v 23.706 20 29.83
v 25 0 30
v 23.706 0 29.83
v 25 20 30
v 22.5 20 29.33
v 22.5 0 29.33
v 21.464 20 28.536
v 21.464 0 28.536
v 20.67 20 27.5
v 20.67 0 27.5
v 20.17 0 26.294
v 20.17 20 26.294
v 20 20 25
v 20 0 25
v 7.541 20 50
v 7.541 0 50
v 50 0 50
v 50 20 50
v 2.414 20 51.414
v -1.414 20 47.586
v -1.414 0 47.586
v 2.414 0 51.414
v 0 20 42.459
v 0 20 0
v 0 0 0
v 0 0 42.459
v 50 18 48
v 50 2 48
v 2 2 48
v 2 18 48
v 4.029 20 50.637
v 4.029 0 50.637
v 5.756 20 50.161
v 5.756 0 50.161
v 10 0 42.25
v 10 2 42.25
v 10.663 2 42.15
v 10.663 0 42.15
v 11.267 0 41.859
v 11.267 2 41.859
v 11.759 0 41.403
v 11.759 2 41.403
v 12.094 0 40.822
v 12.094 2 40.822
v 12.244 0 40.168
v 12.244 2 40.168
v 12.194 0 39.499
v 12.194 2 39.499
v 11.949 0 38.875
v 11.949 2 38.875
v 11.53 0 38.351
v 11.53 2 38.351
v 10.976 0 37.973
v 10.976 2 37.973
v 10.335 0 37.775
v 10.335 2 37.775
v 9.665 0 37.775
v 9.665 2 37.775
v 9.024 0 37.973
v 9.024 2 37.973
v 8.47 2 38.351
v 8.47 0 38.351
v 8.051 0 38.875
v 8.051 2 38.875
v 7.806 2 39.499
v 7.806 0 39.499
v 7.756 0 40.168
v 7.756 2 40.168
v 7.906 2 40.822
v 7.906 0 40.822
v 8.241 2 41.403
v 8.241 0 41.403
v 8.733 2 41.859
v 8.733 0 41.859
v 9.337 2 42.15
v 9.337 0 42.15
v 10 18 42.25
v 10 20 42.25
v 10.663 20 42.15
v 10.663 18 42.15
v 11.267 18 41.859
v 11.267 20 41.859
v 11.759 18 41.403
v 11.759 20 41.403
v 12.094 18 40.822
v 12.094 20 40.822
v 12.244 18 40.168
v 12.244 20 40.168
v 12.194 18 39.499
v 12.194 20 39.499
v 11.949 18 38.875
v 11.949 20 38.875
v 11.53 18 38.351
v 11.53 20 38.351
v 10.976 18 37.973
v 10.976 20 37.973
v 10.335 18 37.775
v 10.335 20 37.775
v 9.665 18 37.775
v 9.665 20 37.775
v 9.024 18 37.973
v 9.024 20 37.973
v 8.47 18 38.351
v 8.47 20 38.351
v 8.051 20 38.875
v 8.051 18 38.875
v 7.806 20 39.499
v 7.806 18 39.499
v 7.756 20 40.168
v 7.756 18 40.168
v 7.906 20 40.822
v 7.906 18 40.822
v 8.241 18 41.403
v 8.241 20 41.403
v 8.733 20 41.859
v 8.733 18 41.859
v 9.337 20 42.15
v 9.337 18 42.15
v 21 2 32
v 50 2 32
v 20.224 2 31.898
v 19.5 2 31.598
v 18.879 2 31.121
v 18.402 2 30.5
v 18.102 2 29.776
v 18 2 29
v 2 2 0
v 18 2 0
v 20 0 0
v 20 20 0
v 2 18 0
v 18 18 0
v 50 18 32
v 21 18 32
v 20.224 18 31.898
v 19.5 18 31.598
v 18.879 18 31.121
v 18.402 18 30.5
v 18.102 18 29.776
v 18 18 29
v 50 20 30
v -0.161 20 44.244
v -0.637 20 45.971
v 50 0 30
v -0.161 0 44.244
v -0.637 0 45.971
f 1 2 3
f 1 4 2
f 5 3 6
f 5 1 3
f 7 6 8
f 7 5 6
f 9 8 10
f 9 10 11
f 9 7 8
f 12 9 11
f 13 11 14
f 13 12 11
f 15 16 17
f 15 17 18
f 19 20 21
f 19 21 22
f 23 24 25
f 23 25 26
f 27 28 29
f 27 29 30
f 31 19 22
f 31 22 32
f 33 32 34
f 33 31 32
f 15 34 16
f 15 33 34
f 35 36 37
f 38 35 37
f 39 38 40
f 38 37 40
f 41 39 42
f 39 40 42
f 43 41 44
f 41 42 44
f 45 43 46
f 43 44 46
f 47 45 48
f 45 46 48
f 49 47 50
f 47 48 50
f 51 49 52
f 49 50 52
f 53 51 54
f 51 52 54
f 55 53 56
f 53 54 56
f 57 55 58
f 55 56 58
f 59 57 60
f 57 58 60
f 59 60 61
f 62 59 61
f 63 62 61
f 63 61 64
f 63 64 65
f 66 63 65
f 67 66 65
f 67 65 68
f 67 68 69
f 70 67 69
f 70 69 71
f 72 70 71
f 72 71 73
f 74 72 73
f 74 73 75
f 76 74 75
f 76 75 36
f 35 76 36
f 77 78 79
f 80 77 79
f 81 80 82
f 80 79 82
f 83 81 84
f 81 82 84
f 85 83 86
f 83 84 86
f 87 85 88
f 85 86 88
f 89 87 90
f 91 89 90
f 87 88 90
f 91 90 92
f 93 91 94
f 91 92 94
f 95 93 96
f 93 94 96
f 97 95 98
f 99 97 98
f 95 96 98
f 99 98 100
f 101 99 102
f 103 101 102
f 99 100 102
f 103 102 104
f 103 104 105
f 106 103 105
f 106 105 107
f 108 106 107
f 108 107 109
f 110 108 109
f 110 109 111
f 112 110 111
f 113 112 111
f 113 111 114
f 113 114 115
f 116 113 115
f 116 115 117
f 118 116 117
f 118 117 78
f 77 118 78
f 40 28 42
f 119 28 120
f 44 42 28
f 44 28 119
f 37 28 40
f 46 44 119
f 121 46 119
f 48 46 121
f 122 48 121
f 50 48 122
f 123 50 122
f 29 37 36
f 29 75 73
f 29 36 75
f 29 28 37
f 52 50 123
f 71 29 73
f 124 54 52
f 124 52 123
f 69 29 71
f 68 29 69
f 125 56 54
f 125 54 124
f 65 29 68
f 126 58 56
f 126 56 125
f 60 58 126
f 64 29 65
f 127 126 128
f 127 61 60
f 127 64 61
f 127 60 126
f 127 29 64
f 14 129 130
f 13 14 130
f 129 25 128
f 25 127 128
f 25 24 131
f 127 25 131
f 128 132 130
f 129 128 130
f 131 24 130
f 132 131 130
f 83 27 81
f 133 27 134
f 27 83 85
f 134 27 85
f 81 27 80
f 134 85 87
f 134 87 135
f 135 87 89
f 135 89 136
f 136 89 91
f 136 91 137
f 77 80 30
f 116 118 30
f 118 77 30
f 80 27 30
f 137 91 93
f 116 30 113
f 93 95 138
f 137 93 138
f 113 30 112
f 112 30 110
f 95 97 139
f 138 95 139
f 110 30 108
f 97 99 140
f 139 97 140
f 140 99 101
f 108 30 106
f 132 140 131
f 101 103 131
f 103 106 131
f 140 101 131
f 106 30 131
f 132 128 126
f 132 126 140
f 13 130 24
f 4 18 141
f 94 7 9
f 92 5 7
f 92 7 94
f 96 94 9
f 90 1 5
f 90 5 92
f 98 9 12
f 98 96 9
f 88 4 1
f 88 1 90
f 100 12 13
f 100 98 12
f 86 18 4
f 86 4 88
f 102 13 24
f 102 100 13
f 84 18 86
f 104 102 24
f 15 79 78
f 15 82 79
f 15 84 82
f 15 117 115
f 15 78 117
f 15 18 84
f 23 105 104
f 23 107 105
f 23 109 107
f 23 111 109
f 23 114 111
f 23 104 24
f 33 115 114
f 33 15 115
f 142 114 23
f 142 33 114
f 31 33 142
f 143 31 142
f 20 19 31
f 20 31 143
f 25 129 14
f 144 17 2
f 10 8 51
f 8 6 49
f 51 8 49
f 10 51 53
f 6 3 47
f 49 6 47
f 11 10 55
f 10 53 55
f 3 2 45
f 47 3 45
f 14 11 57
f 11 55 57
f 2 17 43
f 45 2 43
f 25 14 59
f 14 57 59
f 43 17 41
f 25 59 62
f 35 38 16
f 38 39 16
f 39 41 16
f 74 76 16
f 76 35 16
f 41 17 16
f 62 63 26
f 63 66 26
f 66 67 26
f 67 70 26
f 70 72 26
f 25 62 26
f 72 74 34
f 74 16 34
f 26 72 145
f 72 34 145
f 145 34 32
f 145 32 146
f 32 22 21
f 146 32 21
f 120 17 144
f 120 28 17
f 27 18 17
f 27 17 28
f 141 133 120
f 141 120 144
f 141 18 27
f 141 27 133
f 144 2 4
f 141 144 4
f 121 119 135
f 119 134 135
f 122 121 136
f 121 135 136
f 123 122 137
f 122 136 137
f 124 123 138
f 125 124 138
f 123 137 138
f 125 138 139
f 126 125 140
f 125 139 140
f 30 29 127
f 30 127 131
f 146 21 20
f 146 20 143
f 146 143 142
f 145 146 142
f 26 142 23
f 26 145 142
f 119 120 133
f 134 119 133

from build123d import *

# Parameters (mm, degrees)
SKETCH1_W                = 20
SKETCH1_H                = 20
SKETCH1_W_2              = 16
SKETCH1_H_2              = 16
BOSS_EXTRUDE1_DEPTH      = 30
BOSS_EXTRUDE2_DEPTH      = 30
BOSS_EXTRUDE2_DEPTH_BACK = 20
SKETCH2_W                = 20
SKETCH2_H                = 20
SKETCH2_W_2              = 16
SKETCH2_H_2              = 16
SKETCH3_W                = 16
SKETCH3_H                = 16
CUT_EXTRUDE1_DEPTH       = 2
SKETCH4_W                = 16
SKETCH4_H                = 16
BOSS_EXTRUDE3_DEPTH      = 2
CHAMFER1_SIZE            = 1
BOSS_EXTRUDE4_REACH      = 83.243
SKETCH5_W                = 2
SKETCH5_H                = 20
BOSS_EXTRUDE6_REACH      = 83.243
SKETCH7_W                = 2
SKETCH7_H                = 20
FILLET1_R                = 10
FILLET2_R                = 3
CUT_EXTRUDE2_REACH       = 76.454
SKETCH8_R                = 2.25
FILLET3_R                = 5


with BuildPart() as part:
    # Sketch1 → Boss-Extrude1 (new body)
    with BuildSketch(Plane.XY):
        with Locations((10, 10)):
            Rectangle(SKETCH1_W, SKETCH1_H)
        with Locations((10, 10)):
            Rectangle(SKETCH1_W_2, SKETCH1_H_2, mode=Mode.SUBTRACT)
    extrude(amount=BOSS_EXTRUDE1_DEPTH)

    # Sketch2 → Boss-Extrude2 (add, two sides: drawn at the far end of the back side and taken through both)
    with BuildSketch(Plane(origin=(20, 0, 0), x_dir=(0, 0, -1), z_dir=(1, 0, 0)).offset(-BOSS_EXTRUDE2_DEPTH_BACK)):
        with Locations((-40, 10)):
            Rectangle(SKETCH2_W, SKETCH2_H)
        with Locations((-40, 10)):
            Rectangle(SKETCH2_W_2, SKETCH2_H_2, mode=Mode.SUBTRACT)
    extrude(amount=BOSS_EXTRUDE2_DEPTH + BOSS_EXTRUDE2_DEPTH_BACK)

    # Sketch3 → Cut-Extrude1 (cut)
    with BuildSketch(Plane(origin=(0, 0, 30), x_dir=(-1, 0, 0), z_dir=(0, 0, -1))):
        with Locations((-10, 10)):
            Rectangle(SKETCH3_W, SKETCH3_H)
    extrude(amount=-CUT_EXTRUDE1_DEPTH, mode=Mode.SUBTRACT)

    # Sketch4 → Boss-Extrude3 (add)
    with BuildSketch(Plane.ZY):
        with Locations((40, 10)):
            Rectangle(SKETCH4_W, SKETCH4_H)
    extrude(amount=-BOSS_EXTRUDE3_DEPTH)

    # Chamfer1
    chamfer1_edges = [part.edges().sort_by_distance(p)[0] for p in [
        (0, 10, 50),
    ]]
    chamfer(chamfer1_edges, length=CHAMFER1_SIZE)

    # Boss-Extrude4: up to this face of the body (flat: up to its plane)
    boss_extrude4_end = Plane(part.part.faces().sort_by_distance((0, 10, 24.5))[0])
    # Sketch5 → Boss-Extrude4 (add, up to the picked face)
    with BuildSketch(Plane(origin=(-24.5, 0, 24.5), x_dir=(0.7071067811865475, 0, 0.7071067811865477), z_dir=(-0.7071067811865477, 0, 0.7071067811865475)), mode=Mode.PRIVATE) as boss_extrude4_sk1:
        with Locations((33.648232278, 10)):
            Rectangle(SKETCH5_W, SKETCH5_H)
    boss_extrude4_tool1 = split(extrude(boss_extrude4_sk1.sketch, amount=-BOSS_EXTRUDE4_REACH, mode=Mode.PRIVATE), bisect_by=boss_extrude4_end, keep=Keep.BOTH, mode=Mode.PRIVATE)
    add(boss_extrude4_tool1.solids().sort_by(Axis((-0.707107, 10, 48.292893), (0.7071067811865477, 0, -0.7071067811865475)))[0])

    # Boss-Extrude6: up to this face of the body (flat: up to its plane)
    boss_extrude6_end = Plane(part.part.faces().sort_by_distance((25.5, 10, 50))[0])
    # Sketch7 → Boss-Extrude6 (add, up to the picked face)
    with BuildSketch(Plane(origin=(-24.5, 0, 24.5), x_dir=(0.7071067811865475, 0, 0.7071067811865477), z_dir=(-0.7071067811865477, 0, 0.7071067811865475)), mode=Mode.PRIVATE) as boss_extrude6_sk1:
        with Locations((37.062445841, 10)):
            Rectangle(SKETCH7_W, SKETCH7_H)
    boss_extrude6_tool1 = split(extrude(boss_extrude6_sk1.sketch, amount=-BOSS_EXTRUDE6_REACH, mode=Mode.PRIVATE), bisect_by=boss_extrude6_end, keep=Keep.BOTH, mode=Mode.PRIVATE)
    add(boss_extrude6_tool1.solids().sort_by(Axis((1.707107, 10, 50.707107), (0.7071067811865477, 0, -0.7071067811865475)))[0])

    # Fillet1
    # the kernel refuses this fillet: 10 mm, written as the material it adds along each edge
    with BuildSketch(Plane(origin=(0, 0, 46.171572875), x_dir=(-0.7071067811878772, 0, 0.7071067811852179), z_dir=(0, 1, 0))) as fillet1_piece_1:
        with BuildLine():
            CenterArc((4.445859456, -9.696276168), FILLET1_R, 104.157365729, 30.842634271)
            Line((-2.625208356, -2.625208356), (-2.766629712, -2.483787))
            Line((-2.766629712, -2.483787), (-0.141421356, 0.141421356))
            Line((-0.141421356, 0.141421356), (0, 0.2))
            ThreePointArc((0, 0.2), (1, 0.2), (1.951082811, 0.193925523))
            Line((1.951082811, 0.193925523), (2, 0))
        make_face()
    extrude(amount=20)
    with BuildSketch(Plane(origin=(3.828427125, 20, 50), x_dir=(1, 0, 0), z_dir=(0, -1, 0))) as fillet1_piece_2:
        with BuildLine():
            CenterArc((3.712605261, 10), FILLET1_R, 239.157365729, 30.842634271)
            Line((-1.414213562, 1.414213562), (-1.516749939, 1.242497834))
            ThreePointArc((-1.516749939, 1.242497834), (-0.848528137, 0.565685425), (-0.141421356, -0.141421356))
            Line((-0.141421356, -0.141421356), (0, -0.2))
            Line((0, -0.2), (3.712605261, -0.2))
            Line((3.712605261, -0.2), (3.712605261, 0))
        make_face()
    extrude(amount=20)

    # Fillet2
    fillet2_edges = [part.edges().sort_by_distance(p)[0] for p in [
        (18, 10, 32),
    ]]
    fillet(fillet2_edges, radius=FILLET2_R)

    # Cut-Extrude2: up to this face of the body (flat: up to its plane)
    cut_extrude2_end = Plane(part.part.faces().sort_by_distance((19.305922938, 0, 30.694077062))[0])
    # Sketch8 → Cut-Extrude2 (cut, up to the picked face)
    with BuildSketch(Plane(origin=(0, 20, 0), x_dir=(1, 0, 0), z_dir=(0, 1, 0)), mode=Mode.PRIVATE) as cut_extrude2_sk1:
        with Locations(Location((10, -40, 0), (0, 0, 270))):
            Circle(SKETCH8_R)
    cut_extrude2_tool1 = split(extrude(cut_extrude2_sk1.sketch, amount=-CUT_EXTRUDE2_REACH, mode=Mode.PRIVATE), bisect_by=cut_extrude2_end, keep=Keep.BOTH, mode=Mode.PRIVATE)
    add(cut_extrude2_tool1.solids().sort_by(Axis((10, 20, 40), (0, -1, 0)))[0], mode=Mode.SUBTRACT)

    # Fillet3
    fillet3_edges = [part.edges().sort_by_distance(p)[0] for p in [
        (20, 10, 30),
    ]]
    fillet(fillet3_edges, radius=FILLET3_R)


solid = part.part
